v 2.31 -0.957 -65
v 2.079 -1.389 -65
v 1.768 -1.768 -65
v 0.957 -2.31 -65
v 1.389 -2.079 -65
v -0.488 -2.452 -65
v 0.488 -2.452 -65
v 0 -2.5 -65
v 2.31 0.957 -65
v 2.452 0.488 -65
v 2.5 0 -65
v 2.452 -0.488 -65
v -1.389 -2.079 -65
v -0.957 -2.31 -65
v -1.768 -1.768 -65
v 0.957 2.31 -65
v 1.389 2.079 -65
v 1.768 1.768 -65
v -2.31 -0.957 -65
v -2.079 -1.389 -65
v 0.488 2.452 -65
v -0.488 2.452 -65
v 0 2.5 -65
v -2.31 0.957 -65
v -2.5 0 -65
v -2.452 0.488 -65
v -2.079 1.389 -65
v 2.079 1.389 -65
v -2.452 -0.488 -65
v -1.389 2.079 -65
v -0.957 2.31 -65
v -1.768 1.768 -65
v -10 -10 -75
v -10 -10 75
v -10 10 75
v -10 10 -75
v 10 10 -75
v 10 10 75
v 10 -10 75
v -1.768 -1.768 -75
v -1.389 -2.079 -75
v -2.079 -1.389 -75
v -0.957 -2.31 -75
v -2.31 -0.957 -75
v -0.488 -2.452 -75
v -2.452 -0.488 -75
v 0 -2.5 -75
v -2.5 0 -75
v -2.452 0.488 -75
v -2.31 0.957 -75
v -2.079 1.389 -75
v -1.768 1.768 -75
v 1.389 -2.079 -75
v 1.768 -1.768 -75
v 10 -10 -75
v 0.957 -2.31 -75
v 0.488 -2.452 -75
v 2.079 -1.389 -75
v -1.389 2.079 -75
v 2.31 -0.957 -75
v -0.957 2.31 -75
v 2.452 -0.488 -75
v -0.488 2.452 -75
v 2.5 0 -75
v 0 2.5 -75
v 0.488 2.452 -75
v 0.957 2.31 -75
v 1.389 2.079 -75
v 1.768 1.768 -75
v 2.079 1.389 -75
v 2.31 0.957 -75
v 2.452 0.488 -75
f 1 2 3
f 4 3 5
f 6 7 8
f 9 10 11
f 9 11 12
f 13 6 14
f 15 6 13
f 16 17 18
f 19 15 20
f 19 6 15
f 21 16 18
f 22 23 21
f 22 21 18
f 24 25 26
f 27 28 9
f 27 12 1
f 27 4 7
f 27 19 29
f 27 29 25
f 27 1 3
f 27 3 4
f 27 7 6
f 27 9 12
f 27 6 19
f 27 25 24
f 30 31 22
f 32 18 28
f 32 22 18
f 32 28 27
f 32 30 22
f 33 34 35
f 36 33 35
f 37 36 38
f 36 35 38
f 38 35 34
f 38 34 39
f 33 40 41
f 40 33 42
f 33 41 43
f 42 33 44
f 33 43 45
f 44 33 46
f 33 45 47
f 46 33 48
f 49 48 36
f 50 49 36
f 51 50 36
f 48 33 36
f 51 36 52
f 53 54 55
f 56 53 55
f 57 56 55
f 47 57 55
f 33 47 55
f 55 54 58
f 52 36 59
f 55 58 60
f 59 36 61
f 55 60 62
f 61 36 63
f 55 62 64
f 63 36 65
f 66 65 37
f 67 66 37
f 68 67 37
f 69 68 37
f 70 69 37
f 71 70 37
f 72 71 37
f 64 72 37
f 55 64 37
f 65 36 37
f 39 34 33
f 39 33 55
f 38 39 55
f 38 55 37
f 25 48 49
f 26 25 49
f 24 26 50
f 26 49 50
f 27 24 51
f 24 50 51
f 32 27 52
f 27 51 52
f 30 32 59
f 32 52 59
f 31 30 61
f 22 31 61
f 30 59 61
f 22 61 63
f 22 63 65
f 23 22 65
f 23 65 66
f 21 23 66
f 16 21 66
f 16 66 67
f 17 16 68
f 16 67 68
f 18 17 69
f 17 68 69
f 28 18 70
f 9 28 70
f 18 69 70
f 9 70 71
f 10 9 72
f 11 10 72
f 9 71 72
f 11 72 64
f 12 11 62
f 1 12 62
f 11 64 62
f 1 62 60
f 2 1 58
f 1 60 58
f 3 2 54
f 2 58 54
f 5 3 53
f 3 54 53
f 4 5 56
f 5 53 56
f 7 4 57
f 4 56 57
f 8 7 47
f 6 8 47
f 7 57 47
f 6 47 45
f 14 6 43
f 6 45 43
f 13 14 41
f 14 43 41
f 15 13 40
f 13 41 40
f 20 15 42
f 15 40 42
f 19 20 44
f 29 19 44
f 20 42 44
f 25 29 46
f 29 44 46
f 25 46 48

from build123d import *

# Parameters (mm, degrees)
CROQUIS1_W              = 20
CROQUIS1_H              = 20
SALIENTE_EXTRUIR1_DEPTH = 75
CROQUIS2_R              = 2.5
CORTAR_EXTRUIR2_DEPTH   = 10


with BuildPart() as part:
    # Croquis1 → Saliente-Extruir1 (new, symmetric)
    with BuildSketch(Plane.XY):
        Rectangle(CROQUIS1_W, CROQUIS1_H)
    extrude(amount=SALIENTE_EXTRUIR1_DEPTH, both=True)

    # Croquis2 → Cortar-Extruir2 (cut)
    with BuildSketch(Plane(origin=(0, 0, -75), x_dir=(-1, 0, 0), z_dir=(0, 0, -1))):
        Circle(CROQUIS2_R)
    extrude(amount=-CORTAR_EXTRUIR2_DEPTH, mode=Mode.SUBTRACT)


solid = part.part
